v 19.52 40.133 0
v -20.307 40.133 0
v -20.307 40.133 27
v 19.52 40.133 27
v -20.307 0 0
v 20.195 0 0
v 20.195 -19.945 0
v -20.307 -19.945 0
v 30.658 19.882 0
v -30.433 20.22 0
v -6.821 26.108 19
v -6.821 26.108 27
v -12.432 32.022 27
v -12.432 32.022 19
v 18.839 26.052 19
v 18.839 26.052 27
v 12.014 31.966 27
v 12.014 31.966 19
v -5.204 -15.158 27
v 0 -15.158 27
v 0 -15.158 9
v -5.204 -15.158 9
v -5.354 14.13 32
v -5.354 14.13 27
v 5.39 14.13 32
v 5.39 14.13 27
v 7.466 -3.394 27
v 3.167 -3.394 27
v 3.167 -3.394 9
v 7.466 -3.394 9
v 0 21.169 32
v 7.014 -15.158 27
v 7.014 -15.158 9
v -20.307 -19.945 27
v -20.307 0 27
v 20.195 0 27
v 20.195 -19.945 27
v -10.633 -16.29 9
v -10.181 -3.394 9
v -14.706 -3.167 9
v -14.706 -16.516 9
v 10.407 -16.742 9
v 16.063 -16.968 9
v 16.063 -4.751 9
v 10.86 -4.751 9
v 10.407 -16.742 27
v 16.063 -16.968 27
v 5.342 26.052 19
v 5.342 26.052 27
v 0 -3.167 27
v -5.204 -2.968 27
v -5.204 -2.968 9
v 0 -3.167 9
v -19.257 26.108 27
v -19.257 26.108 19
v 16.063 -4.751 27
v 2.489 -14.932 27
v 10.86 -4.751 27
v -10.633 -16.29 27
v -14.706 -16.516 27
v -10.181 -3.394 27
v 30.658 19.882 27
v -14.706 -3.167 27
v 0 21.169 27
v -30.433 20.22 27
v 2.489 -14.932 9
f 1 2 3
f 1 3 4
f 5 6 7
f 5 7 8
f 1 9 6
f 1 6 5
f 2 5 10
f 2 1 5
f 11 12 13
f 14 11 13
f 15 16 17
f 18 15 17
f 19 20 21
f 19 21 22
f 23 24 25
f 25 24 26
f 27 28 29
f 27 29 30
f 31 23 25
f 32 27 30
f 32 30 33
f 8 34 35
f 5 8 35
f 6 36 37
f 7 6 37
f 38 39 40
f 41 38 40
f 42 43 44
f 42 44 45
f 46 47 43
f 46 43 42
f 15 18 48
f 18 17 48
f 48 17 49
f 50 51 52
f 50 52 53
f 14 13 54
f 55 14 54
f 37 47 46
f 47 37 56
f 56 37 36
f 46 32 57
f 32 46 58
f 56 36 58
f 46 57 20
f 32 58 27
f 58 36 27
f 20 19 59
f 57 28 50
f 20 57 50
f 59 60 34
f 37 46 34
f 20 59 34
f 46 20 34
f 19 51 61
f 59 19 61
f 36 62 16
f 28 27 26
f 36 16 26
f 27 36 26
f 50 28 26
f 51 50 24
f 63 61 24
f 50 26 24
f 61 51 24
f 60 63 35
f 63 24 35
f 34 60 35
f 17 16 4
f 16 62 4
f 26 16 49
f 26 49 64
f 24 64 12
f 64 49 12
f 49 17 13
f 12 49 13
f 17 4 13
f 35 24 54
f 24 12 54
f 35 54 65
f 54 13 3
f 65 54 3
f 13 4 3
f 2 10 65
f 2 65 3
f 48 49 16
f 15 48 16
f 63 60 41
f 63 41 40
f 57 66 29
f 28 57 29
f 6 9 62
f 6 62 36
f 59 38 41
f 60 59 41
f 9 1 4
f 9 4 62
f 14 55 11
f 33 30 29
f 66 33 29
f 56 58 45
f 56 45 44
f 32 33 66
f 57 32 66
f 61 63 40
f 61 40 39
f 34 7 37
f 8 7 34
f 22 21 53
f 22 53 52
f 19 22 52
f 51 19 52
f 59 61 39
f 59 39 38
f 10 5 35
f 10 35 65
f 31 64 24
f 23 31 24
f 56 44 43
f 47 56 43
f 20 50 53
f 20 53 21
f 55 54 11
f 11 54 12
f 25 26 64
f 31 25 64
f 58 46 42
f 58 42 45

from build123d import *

# Parameters (mm, degrees)
PAD_DEPTH       = 27
POCKET_DEPTH    = 18
PAD001_DEPTH    = 5
POCKET001_DEPTH = 8


with BuildPart() as part:
    # Sketch → Pad (new body)
    with BuildSketch(Plane.XY):
        Polygon((-20.307119, 40.133461), (19.519873, 40.133461), (30.657932, 19.882448), (20.194906, 0), (20.194906, -19.944538), (-20.307119, -19.944538), (-20.307119, 0), (-30.432625, 20.219969), align=None)
    extrude(amount=PAD_DEPTH)

    # Sketch001 (on Face10 of Pad) → Pocket (cut)
    with BuildSketch(Plane.XY.offset(27)):
        Polygon((-14.705877, -3.167421), (-10.180991, -3.393665), (-10.63348, -16.289593), (-14.705877, -16.515837), align=None)
        Polygon((-5.203616, -2.968245), (0, -3.167421), (0, -15.15837), (-5.203616, -15.15837), align=None)
        Polygon((3.167424, -3.393665), (7.46607, -3.393665), (7.013581, -15.15837), (2.488694, -14.932126), align=None)
        Polygon((10.859732, -4.751131), (16.063354, -4.751131), (16.063354, -16.968325), (10.407243, -16.742081), align=None)
    extrude(amount=-POCKET_DEPTH, mode=Mode.SUBTRACT)

    # Sketch002 (on Face5 of Pocket) → Pad001 (join)
    with BuildSketch(Plane.XY.offset(27)):
        Polygon((0, 21.168507), (-5.353663, 14.129646), (5.389863, 14.129646), align=None)
    extrude(amount=PAD001_DEPTH)

    # Sketch003 (on Face5 of Pad001) → Pocket001 (cut)
    with BuildSketch(Plane.XY.offset(27)):
        Polygon((-12.432311, 32.022194), (-19.256838, 26.107605), (-6.821035, 26.107605), align=None)
        Polygon((12.014428, 31.966341), (5.341558, 26.051752), (18.838953, 26.051752), align=None)
    extrude(amount=-POCKET001_DEPTH, mode=Mode.SUBTRACT)


solid = part.part
